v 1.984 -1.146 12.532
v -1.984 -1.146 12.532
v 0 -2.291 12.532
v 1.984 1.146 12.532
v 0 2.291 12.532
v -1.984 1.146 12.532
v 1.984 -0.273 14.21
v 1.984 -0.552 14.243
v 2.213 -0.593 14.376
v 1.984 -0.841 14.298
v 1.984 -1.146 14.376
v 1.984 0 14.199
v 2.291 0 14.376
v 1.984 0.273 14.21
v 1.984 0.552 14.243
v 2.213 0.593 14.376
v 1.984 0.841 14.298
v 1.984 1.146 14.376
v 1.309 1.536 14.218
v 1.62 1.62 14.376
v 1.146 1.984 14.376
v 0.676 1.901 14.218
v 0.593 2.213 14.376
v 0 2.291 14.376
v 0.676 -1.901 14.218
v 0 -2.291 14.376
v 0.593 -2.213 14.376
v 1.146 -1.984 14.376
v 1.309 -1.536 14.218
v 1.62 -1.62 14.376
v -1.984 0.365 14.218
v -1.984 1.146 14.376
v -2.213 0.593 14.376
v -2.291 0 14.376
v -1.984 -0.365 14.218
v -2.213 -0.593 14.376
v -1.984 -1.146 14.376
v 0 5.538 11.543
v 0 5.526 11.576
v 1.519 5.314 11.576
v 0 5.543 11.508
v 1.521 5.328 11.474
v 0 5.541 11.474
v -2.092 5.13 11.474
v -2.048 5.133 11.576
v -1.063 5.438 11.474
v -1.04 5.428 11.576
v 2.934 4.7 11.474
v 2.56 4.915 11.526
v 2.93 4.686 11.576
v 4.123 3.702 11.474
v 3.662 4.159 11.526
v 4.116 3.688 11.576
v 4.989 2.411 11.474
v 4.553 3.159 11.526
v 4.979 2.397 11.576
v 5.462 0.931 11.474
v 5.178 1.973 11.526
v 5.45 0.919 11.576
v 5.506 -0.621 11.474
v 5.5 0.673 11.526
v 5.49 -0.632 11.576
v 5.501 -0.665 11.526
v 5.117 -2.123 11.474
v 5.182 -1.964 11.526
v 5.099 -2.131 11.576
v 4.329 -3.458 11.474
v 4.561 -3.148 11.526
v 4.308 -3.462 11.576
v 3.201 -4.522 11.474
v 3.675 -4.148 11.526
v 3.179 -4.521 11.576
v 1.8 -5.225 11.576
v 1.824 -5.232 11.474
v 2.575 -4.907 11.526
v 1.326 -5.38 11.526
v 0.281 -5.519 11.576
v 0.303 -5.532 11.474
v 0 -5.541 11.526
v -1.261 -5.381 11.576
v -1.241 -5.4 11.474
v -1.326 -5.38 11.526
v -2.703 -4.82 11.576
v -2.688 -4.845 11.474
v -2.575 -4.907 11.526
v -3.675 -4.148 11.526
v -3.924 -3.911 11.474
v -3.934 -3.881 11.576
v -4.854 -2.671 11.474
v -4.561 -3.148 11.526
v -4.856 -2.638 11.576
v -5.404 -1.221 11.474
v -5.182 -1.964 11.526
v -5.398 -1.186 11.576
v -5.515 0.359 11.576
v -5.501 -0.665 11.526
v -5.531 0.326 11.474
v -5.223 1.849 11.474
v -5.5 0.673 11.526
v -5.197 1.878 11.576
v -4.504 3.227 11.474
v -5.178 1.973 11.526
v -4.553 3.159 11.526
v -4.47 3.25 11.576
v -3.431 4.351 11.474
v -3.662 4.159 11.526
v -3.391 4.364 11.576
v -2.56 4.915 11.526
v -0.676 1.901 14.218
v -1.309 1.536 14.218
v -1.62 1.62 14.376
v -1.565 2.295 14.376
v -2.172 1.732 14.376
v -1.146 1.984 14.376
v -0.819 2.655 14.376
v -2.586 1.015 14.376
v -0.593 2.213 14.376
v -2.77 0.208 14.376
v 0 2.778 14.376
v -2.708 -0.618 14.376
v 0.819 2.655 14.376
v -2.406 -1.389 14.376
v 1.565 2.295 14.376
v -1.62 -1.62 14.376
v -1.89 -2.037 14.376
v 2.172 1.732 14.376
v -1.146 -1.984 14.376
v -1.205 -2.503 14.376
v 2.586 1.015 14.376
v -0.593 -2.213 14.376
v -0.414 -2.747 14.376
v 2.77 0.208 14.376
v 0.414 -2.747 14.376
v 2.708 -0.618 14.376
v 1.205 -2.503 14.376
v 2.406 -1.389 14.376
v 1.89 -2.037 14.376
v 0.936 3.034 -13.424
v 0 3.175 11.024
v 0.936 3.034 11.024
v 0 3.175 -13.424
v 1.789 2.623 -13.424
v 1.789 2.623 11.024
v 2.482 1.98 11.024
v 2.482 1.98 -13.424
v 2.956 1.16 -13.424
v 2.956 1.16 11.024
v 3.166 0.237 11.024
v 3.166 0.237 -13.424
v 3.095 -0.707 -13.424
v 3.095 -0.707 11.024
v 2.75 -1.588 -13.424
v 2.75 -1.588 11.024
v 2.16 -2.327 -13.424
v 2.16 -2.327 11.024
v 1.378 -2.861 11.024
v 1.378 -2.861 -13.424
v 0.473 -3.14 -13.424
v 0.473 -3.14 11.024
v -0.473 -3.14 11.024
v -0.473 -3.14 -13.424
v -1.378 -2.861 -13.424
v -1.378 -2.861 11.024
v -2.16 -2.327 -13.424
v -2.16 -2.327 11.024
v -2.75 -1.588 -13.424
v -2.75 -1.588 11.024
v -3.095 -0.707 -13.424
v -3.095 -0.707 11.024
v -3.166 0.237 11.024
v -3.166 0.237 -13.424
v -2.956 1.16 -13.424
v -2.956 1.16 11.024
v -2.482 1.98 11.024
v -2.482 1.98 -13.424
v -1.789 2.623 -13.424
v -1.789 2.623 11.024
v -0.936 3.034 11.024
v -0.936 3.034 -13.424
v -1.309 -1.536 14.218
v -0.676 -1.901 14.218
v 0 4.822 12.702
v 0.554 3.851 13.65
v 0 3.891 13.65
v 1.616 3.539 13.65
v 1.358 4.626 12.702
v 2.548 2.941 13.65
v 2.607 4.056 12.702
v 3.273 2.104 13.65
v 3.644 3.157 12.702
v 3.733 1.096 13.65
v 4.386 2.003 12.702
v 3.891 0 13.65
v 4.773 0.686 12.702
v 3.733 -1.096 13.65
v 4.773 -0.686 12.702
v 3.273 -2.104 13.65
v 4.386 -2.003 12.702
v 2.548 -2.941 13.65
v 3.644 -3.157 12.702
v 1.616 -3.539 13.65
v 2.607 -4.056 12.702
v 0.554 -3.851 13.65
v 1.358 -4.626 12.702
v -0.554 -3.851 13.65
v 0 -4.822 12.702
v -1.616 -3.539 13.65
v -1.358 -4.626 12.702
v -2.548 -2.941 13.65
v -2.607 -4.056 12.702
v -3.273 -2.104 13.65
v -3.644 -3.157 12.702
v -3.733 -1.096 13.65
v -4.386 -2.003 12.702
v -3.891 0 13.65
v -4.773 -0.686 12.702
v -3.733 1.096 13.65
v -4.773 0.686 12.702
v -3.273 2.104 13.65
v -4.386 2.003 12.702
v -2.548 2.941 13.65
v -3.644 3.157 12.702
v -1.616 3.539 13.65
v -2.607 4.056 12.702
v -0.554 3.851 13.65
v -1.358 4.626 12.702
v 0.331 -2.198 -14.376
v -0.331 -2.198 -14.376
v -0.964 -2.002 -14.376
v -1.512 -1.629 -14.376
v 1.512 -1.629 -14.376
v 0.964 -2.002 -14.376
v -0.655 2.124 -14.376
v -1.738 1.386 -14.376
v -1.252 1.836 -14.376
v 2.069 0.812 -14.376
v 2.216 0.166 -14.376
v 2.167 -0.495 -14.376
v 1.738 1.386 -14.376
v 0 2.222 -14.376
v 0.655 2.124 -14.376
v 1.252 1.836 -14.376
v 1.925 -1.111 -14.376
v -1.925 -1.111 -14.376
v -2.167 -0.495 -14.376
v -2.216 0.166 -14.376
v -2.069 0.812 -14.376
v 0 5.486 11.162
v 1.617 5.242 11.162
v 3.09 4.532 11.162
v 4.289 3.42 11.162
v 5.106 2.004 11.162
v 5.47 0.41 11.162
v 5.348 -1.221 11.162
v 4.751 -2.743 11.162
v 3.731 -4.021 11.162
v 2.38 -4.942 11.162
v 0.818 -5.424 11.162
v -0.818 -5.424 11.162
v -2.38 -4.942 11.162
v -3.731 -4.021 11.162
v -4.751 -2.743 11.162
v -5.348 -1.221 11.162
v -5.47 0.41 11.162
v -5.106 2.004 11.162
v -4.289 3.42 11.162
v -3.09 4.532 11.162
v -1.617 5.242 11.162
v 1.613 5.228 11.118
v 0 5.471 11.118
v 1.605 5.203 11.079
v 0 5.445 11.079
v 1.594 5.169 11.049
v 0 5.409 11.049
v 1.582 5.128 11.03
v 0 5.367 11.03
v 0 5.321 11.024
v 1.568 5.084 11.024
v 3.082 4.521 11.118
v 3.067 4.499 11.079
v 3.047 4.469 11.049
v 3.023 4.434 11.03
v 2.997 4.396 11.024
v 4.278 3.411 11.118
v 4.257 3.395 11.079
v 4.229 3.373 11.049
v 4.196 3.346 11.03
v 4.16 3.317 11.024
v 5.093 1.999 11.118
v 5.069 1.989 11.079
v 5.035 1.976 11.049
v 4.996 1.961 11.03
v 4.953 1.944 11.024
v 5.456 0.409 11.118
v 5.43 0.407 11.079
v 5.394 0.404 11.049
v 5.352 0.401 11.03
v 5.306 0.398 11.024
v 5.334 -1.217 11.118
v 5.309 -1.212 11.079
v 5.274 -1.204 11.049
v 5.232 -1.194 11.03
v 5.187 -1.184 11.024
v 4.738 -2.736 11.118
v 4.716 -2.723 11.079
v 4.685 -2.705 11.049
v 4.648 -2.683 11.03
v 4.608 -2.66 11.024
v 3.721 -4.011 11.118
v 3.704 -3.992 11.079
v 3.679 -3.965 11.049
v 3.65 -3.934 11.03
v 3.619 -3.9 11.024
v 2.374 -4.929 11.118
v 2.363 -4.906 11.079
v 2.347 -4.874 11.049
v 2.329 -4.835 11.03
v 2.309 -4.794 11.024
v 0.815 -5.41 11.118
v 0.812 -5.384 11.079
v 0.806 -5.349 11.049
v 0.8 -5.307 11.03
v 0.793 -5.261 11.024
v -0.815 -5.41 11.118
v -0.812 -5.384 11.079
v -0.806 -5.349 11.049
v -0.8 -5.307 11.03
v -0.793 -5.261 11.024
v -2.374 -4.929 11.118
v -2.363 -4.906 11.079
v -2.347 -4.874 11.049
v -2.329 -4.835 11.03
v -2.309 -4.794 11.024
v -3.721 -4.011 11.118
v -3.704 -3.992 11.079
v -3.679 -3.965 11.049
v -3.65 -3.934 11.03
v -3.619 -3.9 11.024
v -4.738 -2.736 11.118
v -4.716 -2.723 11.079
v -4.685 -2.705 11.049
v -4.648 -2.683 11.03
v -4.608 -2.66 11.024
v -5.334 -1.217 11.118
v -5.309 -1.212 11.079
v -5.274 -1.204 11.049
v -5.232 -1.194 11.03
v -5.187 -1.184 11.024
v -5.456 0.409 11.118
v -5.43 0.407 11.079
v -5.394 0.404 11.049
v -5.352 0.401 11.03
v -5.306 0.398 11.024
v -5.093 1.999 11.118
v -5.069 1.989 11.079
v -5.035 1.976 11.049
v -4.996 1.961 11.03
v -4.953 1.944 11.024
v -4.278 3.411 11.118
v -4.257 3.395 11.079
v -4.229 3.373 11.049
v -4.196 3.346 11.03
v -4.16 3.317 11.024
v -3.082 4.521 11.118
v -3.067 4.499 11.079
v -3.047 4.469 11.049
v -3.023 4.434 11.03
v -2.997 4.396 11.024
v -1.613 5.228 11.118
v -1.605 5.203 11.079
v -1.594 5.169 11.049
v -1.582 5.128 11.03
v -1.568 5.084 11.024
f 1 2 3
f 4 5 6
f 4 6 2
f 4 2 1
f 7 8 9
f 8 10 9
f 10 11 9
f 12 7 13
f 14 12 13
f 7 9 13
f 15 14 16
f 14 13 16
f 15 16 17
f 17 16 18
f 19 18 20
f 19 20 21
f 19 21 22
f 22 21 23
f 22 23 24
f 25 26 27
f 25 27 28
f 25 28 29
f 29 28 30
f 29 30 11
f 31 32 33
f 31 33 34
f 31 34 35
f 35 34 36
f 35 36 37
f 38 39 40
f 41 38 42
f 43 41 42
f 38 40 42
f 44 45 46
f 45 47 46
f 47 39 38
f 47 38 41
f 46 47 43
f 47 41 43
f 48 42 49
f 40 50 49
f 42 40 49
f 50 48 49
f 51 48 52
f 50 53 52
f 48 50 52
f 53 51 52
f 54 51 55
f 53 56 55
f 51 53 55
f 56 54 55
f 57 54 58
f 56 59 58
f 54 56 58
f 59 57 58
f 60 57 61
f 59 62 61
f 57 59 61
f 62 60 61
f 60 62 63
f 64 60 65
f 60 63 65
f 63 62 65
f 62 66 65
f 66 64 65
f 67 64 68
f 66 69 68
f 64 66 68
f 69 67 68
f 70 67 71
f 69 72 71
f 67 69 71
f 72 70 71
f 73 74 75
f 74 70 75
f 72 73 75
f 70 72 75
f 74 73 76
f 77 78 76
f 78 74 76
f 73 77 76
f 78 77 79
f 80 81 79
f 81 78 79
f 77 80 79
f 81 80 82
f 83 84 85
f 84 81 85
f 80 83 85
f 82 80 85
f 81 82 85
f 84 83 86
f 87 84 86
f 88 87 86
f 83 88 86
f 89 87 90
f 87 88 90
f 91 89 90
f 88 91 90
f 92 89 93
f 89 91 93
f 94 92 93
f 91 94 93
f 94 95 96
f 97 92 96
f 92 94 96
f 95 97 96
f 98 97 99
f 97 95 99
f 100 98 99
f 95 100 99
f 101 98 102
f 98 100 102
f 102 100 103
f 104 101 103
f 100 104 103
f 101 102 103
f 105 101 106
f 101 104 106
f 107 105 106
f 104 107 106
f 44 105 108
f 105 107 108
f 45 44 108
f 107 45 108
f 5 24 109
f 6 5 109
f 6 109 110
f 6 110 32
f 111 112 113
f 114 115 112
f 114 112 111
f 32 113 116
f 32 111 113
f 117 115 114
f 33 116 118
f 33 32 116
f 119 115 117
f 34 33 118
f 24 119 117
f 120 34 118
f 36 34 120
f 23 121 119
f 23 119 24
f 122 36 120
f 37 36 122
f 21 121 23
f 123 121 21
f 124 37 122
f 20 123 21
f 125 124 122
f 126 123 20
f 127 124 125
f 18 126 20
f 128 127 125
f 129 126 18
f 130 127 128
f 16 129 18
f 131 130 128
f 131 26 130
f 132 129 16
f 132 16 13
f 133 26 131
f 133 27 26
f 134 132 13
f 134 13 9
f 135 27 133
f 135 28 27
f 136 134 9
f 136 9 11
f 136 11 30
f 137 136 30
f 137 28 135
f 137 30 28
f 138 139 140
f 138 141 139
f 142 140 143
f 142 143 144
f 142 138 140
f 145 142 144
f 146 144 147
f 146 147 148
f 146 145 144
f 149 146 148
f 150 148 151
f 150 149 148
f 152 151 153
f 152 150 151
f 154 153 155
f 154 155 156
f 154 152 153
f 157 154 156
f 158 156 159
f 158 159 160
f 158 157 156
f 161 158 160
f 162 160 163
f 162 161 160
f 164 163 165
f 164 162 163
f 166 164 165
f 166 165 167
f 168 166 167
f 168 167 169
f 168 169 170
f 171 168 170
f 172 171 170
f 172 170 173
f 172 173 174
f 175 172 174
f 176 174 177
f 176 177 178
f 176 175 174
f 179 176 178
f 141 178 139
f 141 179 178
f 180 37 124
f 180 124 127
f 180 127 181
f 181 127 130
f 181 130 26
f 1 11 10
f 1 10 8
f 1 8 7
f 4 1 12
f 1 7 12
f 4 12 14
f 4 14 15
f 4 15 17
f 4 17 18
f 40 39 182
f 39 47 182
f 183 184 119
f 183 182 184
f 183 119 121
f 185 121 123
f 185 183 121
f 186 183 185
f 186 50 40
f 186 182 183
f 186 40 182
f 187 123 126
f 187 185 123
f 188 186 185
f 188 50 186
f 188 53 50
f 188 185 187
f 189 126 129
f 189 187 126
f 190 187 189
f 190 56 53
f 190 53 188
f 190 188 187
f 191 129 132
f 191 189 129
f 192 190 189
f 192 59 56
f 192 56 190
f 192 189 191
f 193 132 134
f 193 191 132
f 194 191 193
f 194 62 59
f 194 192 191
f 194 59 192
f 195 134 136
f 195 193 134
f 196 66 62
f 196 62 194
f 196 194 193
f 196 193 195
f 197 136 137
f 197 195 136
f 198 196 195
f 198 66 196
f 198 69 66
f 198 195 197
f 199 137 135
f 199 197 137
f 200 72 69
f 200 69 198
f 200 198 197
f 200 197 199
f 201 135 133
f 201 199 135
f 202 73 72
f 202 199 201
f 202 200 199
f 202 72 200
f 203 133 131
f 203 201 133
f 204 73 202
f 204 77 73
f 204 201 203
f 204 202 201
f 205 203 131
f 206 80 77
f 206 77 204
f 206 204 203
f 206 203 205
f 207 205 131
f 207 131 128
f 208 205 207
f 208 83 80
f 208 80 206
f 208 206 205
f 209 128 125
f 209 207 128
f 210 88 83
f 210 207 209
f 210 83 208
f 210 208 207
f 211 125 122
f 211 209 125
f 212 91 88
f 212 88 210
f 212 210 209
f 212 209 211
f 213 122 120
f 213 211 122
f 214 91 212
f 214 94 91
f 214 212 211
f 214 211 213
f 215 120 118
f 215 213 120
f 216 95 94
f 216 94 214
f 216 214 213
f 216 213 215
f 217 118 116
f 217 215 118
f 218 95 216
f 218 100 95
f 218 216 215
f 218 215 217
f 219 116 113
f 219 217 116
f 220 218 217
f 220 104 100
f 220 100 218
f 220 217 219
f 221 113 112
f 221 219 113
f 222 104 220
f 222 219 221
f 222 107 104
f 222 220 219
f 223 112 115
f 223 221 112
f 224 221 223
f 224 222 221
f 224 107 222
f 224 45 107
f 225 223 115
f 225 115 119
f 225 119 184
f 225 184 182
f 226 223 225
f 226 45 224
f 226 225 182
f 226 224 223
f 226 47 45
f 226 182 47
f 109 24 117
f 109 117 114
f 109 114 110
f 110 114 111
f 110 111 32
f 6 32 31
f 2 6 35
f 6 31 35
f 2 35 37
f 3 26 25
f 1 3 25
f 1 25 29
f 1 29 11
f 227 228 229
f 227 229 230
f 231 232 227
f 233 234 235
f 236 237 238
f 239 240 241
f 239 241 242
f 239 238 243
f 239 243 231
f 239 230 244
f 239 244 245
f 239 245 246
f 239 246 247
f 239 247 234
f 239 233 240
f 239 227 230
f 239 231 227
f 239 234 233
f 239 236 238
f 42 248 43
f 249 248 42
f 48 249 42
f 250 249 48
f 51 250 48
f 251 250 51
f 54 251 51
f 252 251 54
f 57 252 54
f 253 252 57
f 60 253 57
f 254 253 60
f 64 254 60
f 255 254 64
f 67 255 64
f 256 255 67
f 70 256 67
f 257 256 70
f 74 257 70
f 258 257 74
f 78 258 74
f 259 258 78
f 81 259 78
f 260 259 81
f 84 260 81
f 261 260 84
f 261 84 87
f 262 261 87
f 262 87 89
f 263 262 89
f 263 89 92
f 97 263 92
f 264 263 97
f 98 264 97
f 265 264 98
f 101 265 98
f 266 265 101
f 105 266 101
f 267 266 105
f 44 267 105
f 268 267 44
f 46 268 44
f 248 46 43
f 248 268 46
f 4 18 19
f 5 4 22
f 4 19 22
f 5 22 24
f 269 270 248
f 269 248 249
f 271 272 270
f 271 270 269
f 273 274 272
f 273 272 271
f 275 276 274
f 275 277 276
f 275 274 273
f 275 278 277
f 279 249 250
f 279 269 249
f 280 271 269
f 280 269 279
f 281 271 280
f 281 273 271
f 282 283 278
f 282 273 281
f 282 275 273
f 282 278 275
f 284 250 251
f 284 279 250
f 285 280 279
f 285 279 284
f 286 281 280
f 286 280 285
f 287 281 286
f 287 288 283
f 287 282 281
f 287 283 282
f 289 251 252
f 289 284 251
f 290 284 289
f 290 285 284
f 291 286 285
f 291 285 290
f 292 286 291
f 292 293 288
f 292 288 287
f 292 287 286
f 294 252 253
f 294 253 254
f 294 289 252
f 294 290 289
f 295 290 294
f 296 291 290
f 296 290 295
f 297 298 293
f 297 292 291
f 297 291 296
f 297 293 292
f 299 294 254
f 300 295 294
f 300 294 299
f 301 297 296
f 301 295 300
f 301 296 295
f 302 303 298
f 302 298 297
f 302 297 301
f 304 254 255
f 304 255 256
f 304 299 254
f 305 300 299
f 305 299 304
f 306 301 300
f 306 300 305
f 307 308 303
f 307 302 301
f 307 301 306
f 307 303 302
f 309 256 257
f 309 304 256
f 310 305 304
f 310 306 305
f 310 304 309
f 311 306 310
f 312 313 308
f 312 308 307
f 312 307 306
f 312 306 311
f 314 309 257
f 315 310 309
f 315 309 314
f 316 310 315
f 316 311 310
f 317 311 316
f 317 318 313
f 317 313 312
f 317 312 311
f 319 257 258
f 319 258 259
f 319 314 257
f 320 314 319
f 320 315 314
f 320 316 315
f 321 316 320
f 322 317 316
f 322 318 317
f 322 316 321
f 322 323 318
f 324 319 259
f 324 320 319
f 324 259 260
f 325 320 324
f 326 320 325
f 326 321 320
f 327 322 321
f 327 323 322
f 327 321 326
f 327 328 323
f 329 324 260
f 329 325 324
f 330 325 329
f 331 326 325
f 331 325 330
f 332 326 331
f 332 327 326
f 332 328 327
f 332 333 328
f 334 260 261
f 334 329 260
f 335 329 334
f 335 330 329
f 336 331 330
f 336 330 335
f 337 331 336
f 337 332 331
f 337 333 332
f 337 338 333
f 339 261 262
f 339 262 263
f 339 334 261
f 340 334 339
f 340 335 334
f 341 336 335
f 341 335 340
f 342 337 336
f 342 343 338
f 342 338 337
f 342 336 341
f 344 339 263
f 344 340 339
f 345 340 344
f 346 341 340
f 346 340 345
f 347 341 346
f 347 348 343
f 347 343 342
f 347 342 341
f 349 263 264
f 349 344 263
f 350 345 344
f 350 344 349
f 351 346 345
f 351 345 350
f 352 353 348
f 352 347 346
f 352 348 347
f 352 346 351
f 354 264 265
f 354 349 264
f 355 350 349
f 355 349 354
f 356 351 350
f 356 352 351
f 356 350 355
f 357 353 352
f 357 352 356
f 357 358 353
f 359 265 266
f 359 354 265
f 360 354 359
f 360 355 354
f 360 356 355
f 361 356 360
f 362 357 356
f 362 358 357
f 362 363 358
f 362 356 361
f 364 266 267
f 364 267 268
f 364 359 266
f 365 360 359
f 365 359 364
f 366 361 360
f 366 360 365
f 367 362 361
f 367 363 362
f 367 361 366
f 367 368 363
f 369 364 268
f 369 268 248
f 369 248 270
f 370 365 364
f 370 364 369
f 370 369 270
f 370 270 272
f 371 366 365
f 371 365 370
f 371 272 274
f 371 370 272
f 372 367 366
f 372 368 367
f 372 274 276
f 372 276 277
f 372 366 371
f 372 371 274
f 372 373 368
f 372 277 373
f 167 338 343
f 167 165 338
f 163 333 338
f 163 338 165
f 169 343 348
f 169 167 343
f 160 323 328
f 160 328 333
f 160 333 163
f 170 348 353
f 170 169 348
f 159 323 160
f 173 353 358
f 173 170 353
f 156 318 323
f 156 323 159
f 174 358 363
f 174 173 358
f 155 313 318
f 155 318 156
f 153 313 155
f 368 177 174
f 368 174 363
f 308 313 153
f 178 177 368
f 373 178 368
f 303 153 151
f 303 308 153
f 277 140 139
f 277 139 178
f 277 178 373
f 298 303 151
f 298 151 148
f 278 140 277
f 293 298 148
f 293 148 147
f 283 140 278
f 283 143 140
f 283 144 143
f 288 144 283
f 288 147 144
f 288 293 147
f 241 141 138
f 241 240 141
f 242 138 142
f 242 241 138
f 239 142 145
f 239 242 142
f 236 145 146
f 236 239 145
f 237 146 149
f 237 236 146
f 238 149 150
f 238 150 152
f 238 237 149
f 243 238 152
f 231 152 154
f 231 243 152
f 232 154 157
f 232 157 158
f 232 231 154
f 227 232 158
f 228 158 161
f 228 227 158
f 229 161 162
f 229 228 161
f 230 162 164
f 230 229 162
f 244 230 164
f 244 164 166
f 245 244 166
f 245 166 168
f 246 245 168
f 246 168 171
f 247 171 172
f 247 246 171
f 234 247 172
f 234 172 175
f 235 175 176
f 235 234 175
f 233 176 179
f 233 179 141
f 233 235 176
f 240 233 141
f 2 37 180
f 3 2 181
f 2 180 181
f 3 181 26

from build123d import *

# Parameters (mm, degrees)
CUT_EXTRUDE1_DEPTH = 1.84404
SKETCH5_R          = 2.291358881
CUT_EXTRUDE2_DEPTH = 1.84404
CUT_EXTRUDE2_DRAFT = -60
FILLET1_R          = 0.16764


with BuildPart() as part:
    # Sketch3 → Revolve1 (revolve)
    with BuildSketch(Plane(origin=(0, 0, 0), x_dir=(0, 0, -1), z_dir=(1, 0, 0))):
        with BuildLine():
            Line((-14.3764, 0), (-14.3764, 2.778125))
            ThreePointArc((-14.3764, 2.778125), (-13.182024687, 4.401074199), (-11.52652, 5.5499))
            Line((-11.52652, 5.5499), (-11.0236, 5.461221635))
            Line((-11.0236, 5.461221635), (-11.0236, 3.175))
            Line((-11.0236, 3.175), (13.4239, 3.175))
            Line((13.4239, 3.175), (14.3764, 2.2225))
            Line((14.3764, 2.2225), (14.3764, 0))
            Line((14.3764, 0), (-14.3764, 0))
        make_face()
    revolve(axis=Axis((0, 0, 14.3764), (0, 0, -1)))

    # Sketch4 → Cut-Extrude1 (cut)
    with BuildSketch(Plane.XY.offset(14.3764)):
        Polygon((-1.984375, -1.14567944), (0, -2.291358881), (1.984375, -1.14567944), (1.984375, 1.14567944), (0, 2.291358881), (-1.984375, 1.14567944), align=None)
    extrude(amount=-CUT_EXTRUDE1_DEPTH, mode=Mode.SUBTRACT)


with BuildPart() as cut_extrude2_tool:
    # Sketch5 → Cut-Extrude2 (with draft: the straight prism first)
    with BuildSketch(Plane.XY.offset(14.3764)):
        Circle(SKETCH5_R)
    extrude(amount=-CUT_EXTRUDE2_DEPTH)
    # Cut-Extrude2: the draft: its side faces are tilted about the plane it starts from
    cut_extrude2_sides = [cut_extrude2_tool.faces().sort_by_distance(p)[0] for p in [
        (-2.291358881, 0, 13.45438),
    ]]
    draft(cut_extrude2_sides, Plane.XY.offset(14.3764), CUT_EXTRUDE2_DRAFT)


with BuildPart() as part_1:
    add(part.part)

    # Cut-Extrude2: cut by cut_extrude2_tool
    add(cut_extrude2_tool.part, mode=Mode.SUBTRACT)

    # Fillet1
    fillet1_edges = [part_1.edges().sort_by_distance(p)[0] for p in [
        (0, -5.461221635, 11.0236),
        (0, -5.5499, 11.52652),
    ]]
    fillet(fillet1_edges, radius=FILLET1_R)


solid = part_1.part
